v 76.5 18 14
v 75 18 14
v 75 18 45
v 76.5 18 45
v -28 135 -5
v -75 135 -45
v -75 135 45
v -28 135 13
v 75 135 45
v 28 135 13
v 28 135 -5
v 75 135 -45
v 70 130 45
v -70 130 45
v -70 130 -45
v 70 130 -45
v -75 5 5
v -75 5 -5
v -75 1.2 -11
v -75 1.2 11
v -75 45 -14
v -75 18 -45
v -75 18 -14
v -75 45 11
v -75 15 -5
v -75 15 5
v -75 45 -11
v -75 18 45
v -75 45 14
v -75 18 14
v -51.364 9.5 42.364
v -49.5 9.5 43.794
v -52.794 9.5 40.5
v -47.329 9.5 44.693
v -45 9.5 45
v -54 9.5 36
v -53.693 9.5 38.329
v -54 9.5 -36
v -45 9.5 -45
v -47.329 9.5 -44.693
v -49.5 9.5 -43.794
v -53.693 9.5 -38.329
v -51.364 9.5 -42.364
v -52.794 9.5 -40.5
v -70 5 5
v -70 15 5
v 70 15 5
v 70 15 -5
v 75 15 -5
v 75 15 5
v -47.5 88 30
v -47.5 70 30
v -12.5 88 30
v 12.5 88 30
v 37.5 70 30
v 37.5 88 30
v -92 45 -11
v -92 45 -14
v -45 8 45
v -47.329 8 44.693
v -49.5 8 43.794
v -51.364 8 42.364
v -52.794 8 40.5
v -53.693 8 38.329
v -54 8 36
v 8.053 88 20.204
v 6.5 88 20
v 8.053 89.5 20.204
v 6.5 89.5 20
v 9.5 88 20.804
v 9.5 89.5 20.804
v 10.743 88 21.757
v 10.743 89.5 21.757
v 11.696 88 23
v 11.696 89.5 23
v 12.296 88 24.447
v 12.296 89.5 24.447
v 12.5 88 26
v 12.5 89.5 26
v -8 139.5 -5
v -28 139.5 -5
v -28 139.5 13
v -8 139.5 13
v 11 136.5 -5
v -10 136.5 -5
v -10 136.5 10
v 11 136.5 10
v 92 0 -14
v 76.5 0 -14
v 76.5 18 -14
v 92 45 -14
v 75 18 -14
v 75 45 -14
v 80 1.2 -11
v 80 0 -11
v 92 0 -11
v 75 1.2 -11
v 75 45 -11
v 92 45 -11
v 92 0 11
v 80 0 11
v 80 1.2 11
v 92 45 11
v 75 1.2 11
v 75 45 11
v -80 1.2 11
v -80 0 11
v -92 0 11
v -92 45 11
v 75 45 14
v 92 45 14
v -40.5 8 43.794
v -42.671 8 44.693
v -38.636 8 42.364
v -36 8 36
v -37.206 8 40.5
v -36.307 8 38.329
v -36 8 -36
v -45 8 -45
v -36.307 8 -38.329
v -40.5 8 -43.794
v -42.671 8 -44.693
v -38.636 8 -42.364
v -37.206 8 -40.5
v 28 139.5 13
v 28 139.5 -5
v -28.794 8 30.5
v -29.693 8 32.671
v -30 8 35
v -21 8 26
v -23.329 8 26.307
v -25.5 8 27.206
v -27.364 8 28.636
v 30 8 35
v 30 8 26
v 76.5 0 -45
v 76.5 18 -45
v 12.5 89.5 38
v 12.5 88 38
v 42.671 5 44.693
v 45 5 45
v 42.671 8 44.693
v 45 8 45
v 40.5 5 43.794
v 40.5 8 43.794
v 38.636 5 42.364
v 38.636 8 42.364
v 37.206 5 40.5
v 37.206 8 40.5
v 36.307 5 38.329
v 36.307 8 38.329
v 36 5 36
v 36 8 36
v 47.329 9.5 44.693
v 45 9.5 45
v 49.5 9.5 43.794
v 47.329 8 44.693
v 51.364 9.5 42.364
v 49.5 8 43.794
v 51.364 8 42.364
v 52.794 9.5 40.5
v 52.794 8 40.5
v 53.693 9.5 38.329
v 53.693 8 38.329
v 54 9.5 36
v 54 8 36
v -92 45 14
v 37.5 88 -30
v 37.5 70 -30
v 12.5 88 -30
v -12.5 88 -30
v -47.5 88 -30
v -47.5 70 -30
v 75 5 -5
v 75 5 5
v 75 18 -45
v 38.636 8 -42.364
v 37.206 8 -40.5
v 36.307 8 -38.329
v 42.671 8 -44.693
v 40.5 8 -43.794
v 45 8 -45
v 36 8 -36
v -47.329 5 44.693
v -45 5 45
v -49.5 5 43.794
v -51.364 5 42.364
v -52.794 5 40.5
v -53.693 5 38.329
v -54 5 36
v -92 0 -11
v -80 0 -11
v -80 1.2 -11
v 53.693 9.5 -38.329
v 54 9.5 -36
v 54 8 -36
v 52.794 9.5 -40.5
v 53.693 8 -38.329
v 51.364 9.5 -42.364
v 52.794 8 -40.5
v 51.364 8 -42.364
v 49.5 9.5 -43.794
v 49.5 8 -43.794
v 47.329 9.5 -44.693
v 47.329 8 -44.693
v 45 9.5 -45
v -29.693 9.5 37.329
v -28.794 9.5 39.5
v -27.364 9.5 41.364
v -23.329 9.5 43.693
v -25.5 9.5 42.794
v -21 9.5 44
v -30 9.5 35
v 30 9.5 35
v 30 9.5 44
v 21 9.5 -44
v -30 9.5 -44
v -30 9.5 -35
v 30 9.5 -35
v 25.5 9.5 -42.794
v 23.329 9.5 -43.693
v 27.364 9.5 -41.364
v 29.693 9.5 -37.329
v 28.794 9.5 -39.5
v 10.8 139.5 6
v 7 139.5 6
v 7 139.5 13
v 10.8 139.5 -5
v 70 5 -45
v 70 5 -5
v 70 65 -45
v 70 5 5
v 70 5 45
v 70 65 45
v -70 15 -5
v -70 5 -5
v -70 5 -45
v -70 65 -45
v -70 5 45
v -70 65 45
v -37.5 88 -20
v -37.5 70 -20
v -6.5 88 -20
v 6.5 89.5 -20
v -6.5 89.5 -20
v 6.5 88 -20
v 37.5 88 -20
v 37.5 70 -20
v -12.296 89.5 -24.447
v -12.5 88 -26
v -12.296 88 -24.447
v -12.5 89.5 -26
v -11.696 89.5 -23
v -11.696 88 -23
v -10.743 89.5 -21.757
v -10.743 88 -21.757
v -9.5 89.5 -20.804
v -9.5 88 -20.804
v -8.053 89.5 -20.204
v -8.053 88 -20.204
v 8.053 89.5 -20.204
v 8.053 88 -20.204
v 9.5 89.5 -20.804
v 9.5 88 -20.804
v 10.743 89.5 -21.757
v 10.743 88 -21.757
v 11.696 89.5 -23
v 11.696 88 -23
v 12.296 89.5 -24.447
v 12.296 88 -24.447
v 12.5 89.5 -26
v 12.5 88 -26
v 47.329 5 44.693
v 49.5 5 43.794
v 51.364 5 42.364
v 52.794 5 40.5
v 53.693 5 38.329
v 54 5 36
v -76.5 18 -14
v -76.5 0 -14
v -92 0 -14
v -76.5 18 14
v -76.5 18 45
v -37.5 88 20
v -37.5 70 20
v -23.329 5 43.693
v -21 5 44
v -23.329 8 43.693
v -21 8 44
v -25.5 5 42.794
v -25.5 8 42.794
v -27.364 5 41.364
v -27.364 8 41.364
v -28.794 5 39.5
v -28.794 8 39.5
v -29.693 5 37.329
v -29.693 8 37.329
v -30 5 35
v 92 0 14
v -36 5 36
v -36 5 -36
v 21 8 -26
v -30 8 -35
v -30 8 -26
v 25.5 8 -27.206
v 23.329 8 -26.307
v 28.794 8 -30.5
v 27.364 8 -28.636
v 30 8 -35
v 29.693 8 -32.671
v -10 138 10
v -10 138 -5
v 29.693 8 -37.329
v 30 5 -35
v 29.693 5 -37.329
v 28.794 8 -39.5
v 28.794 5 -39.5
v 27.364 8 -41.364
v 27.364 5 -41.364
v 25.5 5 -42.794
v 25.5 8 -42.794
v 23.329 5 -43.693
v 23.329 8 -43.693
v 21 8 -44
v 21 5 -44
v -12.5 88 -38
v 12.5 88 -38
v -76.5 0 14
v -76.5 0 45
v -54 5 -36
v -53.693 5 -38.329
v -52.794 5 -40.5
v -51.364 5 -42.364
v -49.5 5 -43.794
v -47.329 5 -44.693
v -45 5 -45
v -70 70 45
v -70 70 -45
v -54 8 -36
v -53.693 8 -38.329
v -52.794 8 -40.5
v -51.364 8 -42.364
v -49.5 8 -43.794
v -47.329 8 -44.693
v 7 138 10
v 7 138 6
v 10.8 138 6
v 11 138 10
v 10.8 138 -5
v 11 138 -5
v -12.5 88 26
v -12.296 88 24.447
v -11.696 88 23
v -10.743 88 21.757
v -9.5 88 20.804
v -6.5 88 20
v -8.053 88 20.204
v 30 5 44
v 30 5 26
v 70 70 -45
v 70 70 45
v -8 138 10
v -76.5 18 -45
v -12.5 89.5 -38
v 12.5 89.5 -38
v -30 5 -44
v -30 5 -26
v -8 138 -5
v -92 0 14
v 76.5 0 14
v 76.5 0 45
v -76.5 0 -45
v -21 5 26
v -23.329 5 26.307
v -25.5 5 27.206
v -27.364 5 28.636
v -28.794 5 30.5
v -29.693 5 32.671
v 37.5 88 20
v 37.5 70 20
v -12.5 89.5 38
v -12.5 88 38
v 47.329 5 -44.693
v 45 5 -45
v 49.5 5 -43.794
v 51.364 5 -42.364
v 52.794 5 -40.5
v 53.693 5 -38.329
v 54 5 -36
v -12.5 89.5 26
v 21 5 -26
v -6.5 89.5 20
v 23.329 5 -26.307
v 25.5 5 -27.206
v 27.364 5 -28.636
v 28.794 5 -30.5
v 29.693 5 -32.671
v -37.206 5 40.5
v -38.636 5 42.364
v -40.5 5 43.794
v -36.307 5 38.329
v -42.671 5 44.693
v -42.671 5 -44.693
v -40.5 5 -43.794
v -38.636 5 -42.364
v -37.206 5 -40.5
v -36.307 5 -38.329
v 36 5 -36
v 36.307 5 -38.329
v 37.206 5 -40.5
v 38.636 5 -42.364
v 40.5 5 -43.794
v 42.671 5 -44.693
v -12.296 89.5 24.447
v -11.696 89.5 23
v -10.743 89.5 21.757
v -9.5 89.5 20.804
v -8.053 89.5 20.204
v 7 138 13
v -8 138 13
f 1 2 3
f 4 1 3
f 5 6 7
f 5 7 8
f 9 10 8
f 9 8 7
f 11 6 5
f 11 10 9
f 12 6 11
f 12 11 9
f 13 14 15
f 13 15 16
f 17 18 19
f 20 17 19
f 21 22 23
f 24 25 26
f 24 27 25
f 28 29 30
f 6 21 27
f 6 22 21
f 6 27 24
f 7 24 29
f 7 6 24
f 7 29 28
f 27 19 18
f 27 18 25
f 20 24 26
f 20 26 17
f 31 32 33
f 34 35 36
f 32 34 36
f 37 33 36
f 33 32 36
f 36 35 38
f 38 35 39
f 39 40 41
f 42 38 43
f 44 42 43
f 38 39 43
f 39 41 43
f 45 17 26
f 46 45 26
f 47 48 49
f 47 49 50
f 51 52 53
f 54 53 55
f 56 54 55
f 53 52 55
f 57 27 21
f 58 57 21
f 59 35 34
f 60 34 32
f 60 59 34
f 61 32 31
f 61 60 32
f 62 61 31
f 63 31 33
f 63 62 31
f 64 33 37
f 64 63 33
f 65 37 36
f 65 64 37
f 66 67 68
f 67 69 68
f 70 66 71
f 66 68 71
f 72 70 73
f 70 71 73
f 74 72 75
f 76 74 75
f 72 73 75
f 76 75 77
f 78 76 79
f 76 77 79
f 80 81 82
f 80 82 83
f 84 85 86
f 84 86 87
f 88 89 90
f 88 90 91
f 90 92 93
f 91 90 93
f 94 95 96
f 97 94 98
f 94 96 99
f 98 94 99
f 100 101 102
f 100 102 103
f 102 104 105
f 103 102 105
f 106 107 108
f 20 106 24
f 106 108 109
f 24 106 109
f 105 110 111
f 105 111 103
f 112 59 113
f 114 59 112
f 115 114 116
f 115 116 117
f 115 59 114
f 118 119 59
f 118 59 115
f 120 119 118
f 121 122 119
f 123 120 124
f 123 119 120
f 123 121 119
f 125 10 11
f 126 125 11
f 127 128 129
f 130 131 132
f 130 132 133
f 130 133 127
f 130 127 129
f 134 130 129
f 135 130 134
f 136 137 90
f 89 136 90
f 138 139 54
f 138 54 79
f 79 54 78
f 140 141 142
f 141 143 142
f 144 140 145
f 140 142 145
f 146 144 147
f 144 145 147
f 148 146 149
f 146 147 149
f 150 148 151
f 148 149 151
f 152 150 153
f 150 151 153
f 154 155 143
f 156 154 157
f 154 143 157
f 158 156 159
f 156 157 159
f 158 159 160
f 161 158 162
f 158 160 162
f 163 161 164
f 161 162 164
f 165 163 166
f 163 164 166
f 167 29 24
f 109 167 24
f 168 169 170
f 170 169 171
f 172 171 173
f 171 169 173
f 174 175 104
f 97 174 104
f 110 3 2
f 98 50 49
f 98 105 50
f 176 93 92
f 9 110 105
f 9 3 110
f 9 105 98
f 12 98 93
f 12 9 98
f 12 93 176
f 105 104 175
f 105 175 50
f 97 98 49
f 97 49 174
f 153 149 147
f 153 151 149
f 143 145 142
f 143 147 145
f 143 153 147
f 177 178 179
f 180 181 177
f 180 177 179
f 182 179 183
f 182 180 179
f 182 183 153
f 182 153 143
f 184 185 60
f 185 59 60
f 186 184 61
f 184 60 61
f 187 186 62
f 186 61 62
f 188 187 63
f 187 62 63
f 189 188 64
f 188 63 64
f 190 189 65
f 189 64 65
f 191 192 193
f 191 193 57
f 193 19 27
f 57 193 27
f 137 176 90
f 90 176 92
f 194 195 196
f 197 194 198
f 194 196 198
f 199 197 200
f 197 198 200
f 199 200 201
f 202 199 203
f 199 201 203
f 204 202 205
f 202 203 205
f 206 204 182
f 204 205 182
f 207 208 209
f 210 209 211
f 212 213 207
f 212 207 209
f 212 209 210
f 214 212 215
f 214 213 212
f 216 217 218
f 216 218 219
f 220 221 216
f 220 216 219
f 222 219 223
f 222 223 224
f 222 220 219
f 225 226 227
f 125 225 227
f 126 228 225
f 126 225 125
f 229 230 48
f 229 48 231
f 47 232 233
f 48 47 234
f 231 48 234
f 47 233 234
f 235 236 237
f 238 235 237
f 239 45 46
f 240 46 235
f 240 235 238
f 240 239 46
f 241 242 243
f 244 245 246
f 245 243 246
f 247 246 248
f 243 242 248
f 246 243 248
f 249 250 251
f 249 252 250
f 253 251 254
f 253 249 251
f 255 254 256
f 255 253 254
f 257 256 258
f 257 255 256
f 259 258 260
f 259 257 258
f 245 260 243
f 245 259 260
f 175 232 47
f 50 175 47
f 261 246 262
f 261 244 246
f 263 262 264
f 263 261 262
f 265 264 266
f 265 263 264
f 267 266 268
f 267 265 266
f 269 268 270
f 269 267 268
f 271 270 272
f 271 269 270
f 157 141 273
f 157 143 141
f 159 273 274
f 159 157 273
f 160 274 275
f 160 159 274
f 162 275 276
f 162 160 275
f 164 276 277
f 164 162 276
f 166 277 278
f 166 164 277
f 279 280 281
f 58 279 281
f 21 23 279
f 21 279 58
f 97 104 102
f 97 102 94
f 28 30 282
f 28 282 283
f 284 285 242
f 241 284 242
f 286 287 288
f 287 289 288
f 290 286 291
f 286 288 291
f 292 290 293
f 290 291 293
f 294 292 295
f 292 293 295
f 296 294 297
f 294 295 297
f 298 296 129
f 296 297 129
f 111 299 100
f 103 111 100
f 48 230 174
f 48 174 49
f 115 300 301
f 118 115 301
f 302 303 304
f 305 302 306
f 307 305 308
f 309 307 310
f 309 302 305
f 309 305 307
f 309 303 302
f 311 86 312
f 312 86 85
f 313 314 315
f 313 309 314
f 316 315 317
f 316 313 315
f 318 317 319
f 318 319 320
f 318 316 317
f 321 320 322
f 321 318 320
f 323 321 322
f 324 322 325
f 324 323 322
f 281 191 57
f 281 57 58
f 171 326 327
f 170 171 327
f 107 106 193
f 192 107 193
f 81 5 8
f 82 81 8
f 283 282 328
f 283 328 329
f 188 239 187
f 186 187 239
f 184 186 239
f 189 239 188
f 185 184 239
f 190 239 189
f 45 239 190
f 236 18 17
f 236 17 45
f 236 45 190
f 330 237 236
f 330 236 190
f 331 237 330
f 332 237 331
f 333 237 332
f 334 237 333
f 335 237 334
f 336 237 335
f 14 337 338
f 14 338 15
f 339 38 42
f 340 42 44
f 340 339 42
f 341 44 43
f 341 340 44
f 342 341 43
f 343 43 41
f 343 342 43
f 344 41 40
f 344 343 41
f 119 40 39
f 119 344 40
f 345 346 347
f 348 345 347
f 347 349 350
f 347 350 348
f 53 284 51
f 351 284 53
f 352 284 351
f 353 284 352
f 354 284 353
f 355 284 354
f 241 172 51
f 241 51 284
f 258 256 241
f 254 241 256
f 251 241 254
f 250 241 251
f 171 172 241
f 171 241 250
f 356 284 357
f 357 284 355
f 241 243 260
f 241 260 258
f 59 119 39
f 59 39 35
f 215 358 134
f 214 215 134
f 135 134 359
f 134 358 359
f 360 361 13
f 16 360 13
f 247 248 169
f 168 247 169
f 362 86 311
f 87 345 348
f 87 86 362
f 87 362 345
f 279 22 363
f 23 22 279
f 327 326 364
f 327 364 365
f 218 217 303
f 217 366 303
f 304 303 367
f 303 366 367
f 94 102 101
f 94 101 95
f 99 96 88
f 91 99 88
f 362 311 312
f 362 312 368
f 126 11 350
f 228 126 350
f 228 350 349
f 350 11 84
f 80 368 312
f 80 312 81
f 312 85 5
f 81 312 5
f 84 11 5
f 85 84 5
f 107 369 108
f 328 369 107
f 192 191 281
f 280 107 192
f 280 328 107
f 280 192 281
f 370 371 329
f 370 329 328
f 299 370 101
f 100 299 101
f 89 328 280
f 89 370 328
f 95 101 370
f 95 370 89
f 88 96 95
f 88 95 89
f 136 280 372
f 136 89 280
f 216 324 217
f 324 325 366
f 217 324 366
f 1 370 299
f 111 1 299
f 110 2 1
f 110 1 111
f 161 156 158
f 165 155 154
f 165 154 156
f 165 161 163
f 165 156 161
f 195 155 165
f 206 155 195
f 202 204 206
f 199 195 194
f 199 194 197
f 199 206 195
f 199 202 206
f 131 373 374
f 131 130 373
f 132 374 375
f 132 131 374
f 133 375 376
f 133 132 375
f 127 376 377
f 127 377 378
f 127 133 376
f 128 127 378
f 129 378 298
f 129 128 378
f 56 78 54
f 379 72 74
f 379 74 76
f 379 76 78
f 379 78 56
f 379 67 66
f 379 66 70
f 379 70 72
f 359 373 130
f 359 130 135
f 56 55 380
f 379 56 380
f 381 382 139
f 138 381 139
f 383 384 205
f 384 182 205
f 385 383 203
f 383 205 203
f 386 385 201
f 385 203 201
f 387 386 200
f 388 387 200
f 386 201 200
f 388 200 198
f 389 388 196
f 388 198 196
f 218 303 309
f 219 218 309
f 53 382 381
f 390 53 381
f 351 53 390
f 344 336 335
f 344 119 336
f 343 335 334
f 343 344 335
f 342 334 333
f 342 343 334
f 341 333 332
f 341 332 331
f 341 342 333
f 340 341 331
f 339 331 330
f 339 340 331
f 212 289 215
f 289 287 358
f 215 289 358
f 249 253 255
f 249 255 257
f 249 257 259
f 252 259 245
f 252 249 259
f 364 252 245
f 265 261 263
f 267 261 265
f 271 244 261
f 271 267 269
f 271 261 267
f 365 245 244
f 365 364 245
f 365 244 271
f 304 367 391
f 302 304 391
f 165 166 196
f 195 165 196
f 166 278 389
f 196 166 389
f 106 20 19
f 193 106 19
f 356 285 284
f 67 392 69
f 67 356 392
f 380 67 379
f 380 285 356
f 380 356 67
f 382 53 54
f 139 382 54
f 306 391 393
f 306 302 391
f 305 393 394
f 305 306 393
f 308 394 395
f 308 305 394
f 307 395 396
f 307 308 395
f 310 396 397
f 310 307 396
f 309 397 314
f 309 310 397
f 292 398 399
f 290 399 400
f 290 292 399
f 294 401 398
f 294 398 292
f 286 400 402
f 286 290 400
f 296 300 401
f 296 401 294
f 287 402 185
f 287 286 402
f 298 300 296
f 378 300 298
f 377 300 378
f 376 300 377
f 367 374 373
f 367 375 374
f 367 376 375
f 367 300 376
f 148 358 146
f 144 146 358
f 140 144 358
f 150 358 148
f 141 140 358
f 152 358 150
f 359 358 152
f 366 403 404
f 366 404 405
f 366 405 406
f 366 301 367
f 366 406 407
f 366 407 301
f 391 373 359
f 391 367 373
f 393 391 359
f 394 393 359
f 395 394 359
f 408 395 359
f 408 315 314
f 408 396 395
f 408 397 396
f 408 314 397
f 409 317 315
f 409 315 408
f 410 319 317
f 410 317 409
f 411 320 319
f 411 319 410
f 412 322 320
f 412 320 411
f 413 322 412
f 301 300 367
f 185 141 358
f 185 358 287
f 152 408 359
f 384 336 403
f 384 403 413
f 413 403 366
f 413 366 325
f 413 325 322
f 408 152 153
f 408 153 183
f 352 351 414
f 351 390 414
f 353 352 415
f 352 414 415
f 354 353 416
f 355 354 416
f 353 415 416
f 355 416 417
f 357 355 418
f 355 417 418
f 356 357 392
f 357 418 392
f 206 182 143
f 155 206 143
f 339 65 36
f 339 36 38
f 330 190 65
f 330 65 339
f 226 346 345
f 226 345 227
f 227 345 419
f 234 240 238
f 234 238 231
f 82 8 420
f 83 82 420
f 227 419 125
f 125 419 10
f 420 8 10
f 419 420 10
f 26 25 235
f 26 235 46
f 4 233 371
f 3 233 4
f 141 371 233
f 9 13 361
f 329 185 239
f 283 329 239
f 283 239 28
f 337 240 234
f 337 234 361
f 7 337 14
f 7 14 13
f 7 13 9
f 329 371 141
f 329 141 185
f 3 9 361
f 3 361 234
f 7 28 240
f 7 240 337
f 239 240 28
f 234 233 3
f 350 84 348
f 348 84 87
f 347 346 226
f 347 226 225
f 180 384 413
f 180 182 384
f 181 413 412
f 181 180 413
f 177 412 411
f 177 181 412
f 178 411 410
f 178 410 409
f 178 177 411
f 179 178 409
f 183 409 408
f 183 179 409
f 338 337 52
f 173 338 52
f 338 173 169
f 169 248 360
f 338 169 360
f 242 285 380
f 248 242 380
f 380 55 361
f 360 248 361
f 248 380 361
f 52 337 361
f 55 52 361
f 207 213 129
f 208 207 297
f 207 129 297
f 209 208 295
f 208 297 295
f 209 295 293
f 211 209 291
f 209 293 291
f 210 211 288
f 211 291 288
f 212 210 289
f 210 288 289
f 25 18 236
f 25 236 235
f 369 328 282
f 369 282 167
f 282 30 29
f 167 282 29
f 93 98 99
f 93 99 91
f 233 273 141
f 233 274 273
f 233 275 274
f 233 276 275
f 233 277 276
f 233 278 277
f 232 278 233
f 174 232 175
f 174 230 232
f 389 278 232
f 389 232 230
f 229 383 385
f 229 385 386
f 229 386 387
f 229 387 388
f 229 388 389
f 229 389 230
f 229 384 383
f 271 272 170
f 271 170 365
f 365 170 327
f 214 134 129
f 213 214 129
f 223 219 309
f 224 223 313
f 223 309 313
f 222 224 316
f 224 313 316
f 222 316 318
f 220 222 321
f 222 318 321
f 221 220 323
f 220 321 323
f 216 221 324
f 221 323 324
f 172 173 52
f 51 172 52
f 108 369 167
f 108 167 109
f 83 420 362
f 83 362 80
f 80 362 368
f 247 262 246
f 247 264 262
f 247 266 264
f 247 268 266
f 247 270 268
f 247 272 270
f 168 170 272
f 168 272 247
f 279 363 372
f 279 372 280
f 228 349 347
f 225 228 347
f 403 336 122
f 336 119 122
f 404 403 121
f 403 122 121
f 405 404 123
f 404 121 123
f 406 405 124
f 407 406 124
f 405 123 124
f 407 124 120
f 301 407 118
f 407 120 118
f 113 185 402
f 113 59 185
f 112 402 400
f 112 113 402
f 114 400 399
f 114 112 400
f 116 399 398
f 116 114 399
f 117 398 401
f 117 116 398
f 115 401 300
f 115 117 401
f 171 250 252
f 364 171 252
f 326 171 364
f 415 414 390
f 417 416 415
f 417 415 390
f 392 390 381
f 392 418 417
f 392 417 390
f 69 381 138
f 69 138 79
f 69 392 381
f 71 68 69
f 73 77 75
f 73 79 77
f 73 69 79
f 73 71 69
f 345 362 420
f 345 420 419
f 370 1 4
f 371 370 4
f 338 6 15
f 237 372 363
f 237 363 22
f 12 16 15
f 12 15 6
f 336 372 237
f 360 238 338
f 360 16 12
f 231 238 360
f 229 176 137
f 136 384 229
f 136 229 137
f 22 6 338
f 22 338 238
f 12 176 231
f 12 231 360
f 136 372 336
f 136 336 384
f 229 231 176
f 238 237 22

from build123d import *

# Parameters (mm, degrees)
SKETCH1_W            = 150
SKETCH1_H            = 90
BOSS_EXTRUDE1_DEPTH  = 135
SKETCH2_W            = 140
SKETCH2_H            = 60
CUT_EXTRUDE1_DEPTH   = 135
SKETCH3_W            = 3
SKETCH3_H            = 45
BOSS_EXTRUDE2_DEPTH  = 17
SKETCH4_W            = 22
SKETCH4_H            = 5
BOSS_EXTRUDE3_DEPTH  = 7
MIRROR2_OUTLINE_W    = 7
MIRROR2_OUTLINE_H    = 22
MIRROR2_DEPTH        = 5
SKETCH5_W            = 10
SKETCH5_H            = 10
CUT_EXTRUDE3_DEPTH   = 220.406016326
SKETCH6_W            = 56
SKETCH6_H            = 18
BOSS_EXTRUDE4_DEPTH  = 1.5
SKETCH7_W            = 18
SKETCH7_H            = 90
BOSS_EXTRUDE5_DEPTH  = 3
FILLET1_R            = 9
BOSS_EXTRUDE6_DEPTH  = 1.5
SKETCH11_W           = 60
SKETCH11_H           = 18
BOSS_EXTRUDE7_DEPTH  = 3
FILLET2_R            = 9
BOSS_EXTRUDE8_DEPTH  = 1.5
BOSS_EXTRUDE9_DEPTH  = 18
SKETCH15_W           = 25
SKETCH15_H           = 18
BOSS_EXTRUDE10_DEPTH = 1.5
FILLET3_R            = 6
SKETCH16_W           = 21
SKETCH16_H           = 3
BOSS_EXTRUDE11_DEPTH = 1.5
SKETCH17_W           = 3.8
SKETCH17_H           = 4
SKETCH17_H_2         = 3
SKETCH17_W_2         = 2
SKETCH17_H_3         = 15
BOSS_EXTRUDE13_DEPTH = 1.5
SKETCH18_W           = 31
SKETCH18_H           = 18
BOSS_EXTRUDE14_DEPTH = 1.5
SKETCH19_W           = 22
SKETCH19_H           = 5
CUT_EXTRUDE4_DEPTH   = 14
SKETCH20_W           = 22
SKETCH20_H           = 5
CUT_EXTRUDE5_DEPTH   = 7
SKETCH21_W           = 22
SKETCH21_H           = 1.2
BOSS_EXTRUDE15_DEPTH = 5


# Read off the part's stored shape, not the designer's step: Mirror2
with BuildPart() as part:
    # Sketch1 → Boss-Extrude1 (new body)
    with BuildSketch(Plane(origin=(0, 0, 0), x_dir=(1, 0, 0), z_dir=(0, 1, 0))):
        Rectangle(SKETCH1_W, SKETCH1_H)
    extrude(amount=BOSS_EXTRUDE1_DEPTH)

    # Sketch2 → Cut-Extrude1 (cut)
    with BuildSketch(Plane.XY.offset(45)):
        with Locations((0, 35)):
            Rectangle(SKETCH2_W, SKETCH2_H)
        with Locations((0, 100)):
            Rectangle(SKETCH2_W, SKETCH2_H)
    extrude(amount=-CUT_EXTRUDE1_DEPTH, mode=Mode.SUBTRACT)

    # Sketch3 → Boss-Extrude2 (add)
    with BuildSketch(Plane(origin=(75, 0, 0), x_dir=(0, 0, -1), z_dir=(1, 0, 0))):
        with Locations((12.5, 22.5)):
            Rectangle(SKETCH3_W, SKETCH3_H)
        with Locations((-12.5, 22.5)):
            Rectangle(SKETCH3_W, SKETCH3_H)
    boss_extrude2 = extrude(amount=BOSS_EXTRUDE2_DEPTH)

    # Mirror1: Boss-Extrude2 across plane
    add(boss_extrude2.mirror(Plane(origin=(0, 0, 0), x_dir=(0, 0, 1), z_dir=(1, 0, 0))))

    # Sketch4 → Boss-Extrude3 (add)
    with BuildSketch(Plane.ZY.offset(75)):
        with Locations((0, 2.5)):
            Rectangle(SKETCH4_W, SKETCH4_H)
    extrude(amount=BOSS_EXTRUDE3_DEPTH)

    # Mirror2 outline → Mirror2 (add)
    with BuildSketch(Plane(origin=(0, 0, 0), x_dir=(1, 0, 0), z_dir=(0, 1, 0))):
        with Locations((-85.5, 0)):
            Rectangle(MIRROR2_OUTLINE_W, MIRROR2_OUTLINE_H)
        with Locations((78.5, 0)):
            Rectangle(MIRROR2_OUTLINE_W, MIRROR2_OUTLINE_H)
    extrude(amount=MIRROR2_DEPTH)

    # Sketch5 → Cut-Extrude3 (cut, through all)
    with BuildSketch(Plane.ZY.offset(75)):
        with Locations((0, 10)):
            Rectangle(SKETCH5_W, SKETCH5_H)
    extrude(amount=-CUT_EXTRUDE3_DEPTH, mode=Mode.SUBTRACT)

    # Sketch6 → Boss-Extrude4 (add)
    with BuildSketch(Plane(origin=(0, 135, 0), x_dir=(1, 0, 0), z_dir=(0, 1, 0))):
        with Locations((0, -4)):
            Rectangle(SKETCH6_W, SKETCH6_H)
    extrude(amount=BOSS_EXTRUDE4_DEPTH)

    # Sketch7 → Boss-Extrude5 (add)
    with BuildSketch(Plane(origin=(0, 5, 0), x_dir=(1, 0, 0), z_dir=(0, 1, 0))):
        with Locations((45, 0)):
            Rectangle(SKETCH7_W, SKETCH7_H)
        with Locations((-45, 0)):
            Rectangle(SKETCH7_W, SKETCH7_H)
    extrude(amount=BOSS_EXTRUDE5_DEPTH)

    # Fillet1
    fillet1_edges = [part.edges().sort_by_distance(p)[0] for p in [
        (36, 6.5, 45),
        (54, 6.5, 45),
        (-36, 6.5, 45),
        (-54, 6.5, 45),
        (-54, 6.5, -45),
        (-36, 6.5, -45),
        (54, 6.5, -45),
        (36, 6.5, -45),
    ]]
    fillet(fillet1_edges, radius=FILLET1_R - 0.0001)  # a hair under: the kernel refuses the full size

    # Sketch10 → Boss-Extrude6 (add)
    with BuildSketch(Plane(origin=(0, 8, 0), x_dir=(1, 0, 0), z_dir=(0, 1, 0))):
        with BuildLine():
            Line((-45, 45), (-45, -45))
            ThreePointArc((-45, -45), (-51.363961031, -42.363961031), (-54, -36))
            Line((-54, -36), (-54, 36))
            ThreePointArc((-54, 36), (-51.363961031, 42.363961031), (-45, 45))
        make_face()
        with BuildLine():
            Line((45, 45), (45, -45))
            ThreePointArc((45, -45), (51.363961031, -42.363961031), (54, -36))
            Line((54, -36), (54, 36))
            ThreePointArc((54, 36), (51.363961031, 42.363961031), (45, 45))
        make_face()
    extrude(amount=BOSS_EXTRUDE6_DEPTH)

    # Sketch11 → Boss-Extrude7 (add)
    with BuildSketch(Plane(origin=(0, 5, 0), x_dir=(1, 0, 0), z_dir=(0, 1, 0))):
        with Locations((0, 35)):
            Rectangle(SKETCH11_W, SKETCH11_H)
        with Locations((0, -35)):
            Rectangle(SKETCH11_W, SKETCH11_H)
    extrude(amount=BOSS_EXTRUDE7_DEPTH)

    # Fillet2
    fillet2_edges = [part.edges().sort_by_distance(p)[0] for p in [
        (30, 6.5, -26),
        (30, 6.5, -44),
        (-30, 6.5, 26),
        (-30, 6.5, 44),
    ]]
    fillet(fillet2_edges, radius=FILLET2_R - 0.0001)  # a hair under: the kernel refuses the full size

    # Sketch13 → Boss-Extrude8 (add)
    with BuildSketch(Plane(origin=(0, 8, 0), x_dir=(1, 0, 0), z_dir=(0, 1, 0))):
        with BuildLine():
            Line((21, 44), (-30, 44))
            Line((-30, 44), (-30, 35))
            Line((-30, 35), (30, 35))
            ThreePointArc((30, 35), (27.363961031, 41.363961031), (21, 44))
        make_face()
        with BuildLine():
            Line((-21, -44), (30, -44))
            Line((30, -44), (30, -35))
            Line((30, -35), (-30, -35))
            ThreePointArc((-30, -35), (-27.363961031, -41.363961031), (-21, -44))
        make_face()
    extrude(amount=BOSS_EXTRUDE8_DEPTH)

    # Sketch14 → Boss-Extrude9 (add)
    with BuildSketch(Plane(origin=(0, 70, 0), x_dir=(1, 0, 0), z_dir=(0, 1, 0))):
        Polygon((-47.5, -30), (37.5, -30), (37.5, -20), (-37.5, -20), (-37.5, 20), (37.5, 20), (37.5, 30), (-47.5, 30), align=None)
    extrude(amount=BOSS_EXTRUDE9_DEPTH)

    # Sketch15 → Boss-Extrude10 (add)
    with BuildSketch(Plane(origin=(0, 88, 0), x_dir=(1, 0, 0), z_dir=(0, 1, 0))):
        with Locations((0, -29)):
            Rectangle(SKETCH15_W, SKETCH15_H)
        with Locations((0, 29)):
            Rectangle(SKETCH15_W, SKETCH15_H)
    extrude(amount=BOSS_EXTRUDE10_DEPTH)

    # Fillet3
    fillet3_edges = [part.edges().sort_by_distance(p)[0] for p in [
        (-12.5, 88.75, 20),
        (12.5, 88.75, 20),
        (-12.5, 88.75, -20),
        (12.5, 88.75, -20),
    ]]
    fillet(fillet3_edges, radius=FILLET3_R)

    # Sketch16 → Boss-Extrude11 (add)
    with BuildSketch(Plane(origin=(0, 136.5, 0), x_dir=(1, 0, 0), z_dir=(0, 1, 0))):
        Polygon((-10, 5), (-28, 5), (-28, -13), (-10, -13), (-10, -10), align=None)
        with Locations((0.5, -11.5)):
            Rectangle(SKETCH16_W, SKETCH16_H)
        Polygon((28, 5), (11, 5), (11, -10), (11, -13), (28, -13), align=None)
    extrude(amount=BOSS_EXTRUDE11_DEPTH)

    # Sketch17 → Boss-Extrude13 (add)
    with BuildSketch(Plane(origin=(0, 138, 0), x_dir=(1, 0, 0), z_dir=(0, 1, 0))):
        Polygon((10.8, -6), (10.8, -10), (11, -10), (11, 5), (10.8, 5), align=None)
        Polygon((10.8, -10), (10.8, -13), (28, -13), (28, 5), (11, 5), (11, -10), align=None)
        with Locations((8.9, -8)):
            Rectangle(SKETCH17_W, SKETCH17_H)
        with Locations((8.9, -11.5)):
            Rectangle(SKETCH17_W, SKETCH17_H_2)
        Polygon((-10, 5), (-28, 5), (-28, -13), (-8, -13), (-8, -10), (-10, -10), align=None)
        with Locations((-9, -2.5)):
            Rectangle(SKETCH17_W_2, SKETCH17_H_3)
    extrude(amount=BOSS_EXTRUDE13_DEPTH)

    # Sketch18 → Boss-Extrude14 (add)
    with BuildSketch(Plane.ZY.offset(75)):
        with Locations((29.5, 9)):
            Rectangle(SKETCH18_W, SKETCH18_H)
        with Locations((-29.5, 9)):
            Rectangle(SKETCH18_W, SKETCH18_H)
    boss_extrude14 = extrude(amount=BOSS_EXTRUDE14_DEPTH)

    # Mirror3: Boss-Extrude14 across plane
    add(boss_extrude14.mirror(Plane(origin=(0, 0, 0), x_dir=(0, 0, 1), z_dir=(1, 0, 0))))

    # Sketch19 → Cut-Extrude4 (cut)
    with BuildSketch(Plane.ZY.offset(89)):
        with Locations((0, 2.5)):
            Rectangle(SKETCH19_W, SKETCH19_H)
    extrude(amount=-CUT_EXTRUDE4_DEPTH, mode=Mode.SUBTRACT)

    # Sketch20 → Cut-Extrude5 (cut)
    with BuildSketch(Plane(origin=(82, 0, 0), x_dir=(0, 0, -1), z_dir=(1, 0, 0))):
        with Locations((0, 2.5)):
            Rectangle(SKETCH20_W, SKETCH20_H)
    extrude(amount=-CUT_EXTRUDE5_DEPTH, mode=Mode.SUBTRACT)

    # Sketch21 → Boss-Extrude15 (add)
    with BuildSketch(Plane(origin=(75, 0, 0), x_dir=(0, 0, -1), z_dir=(1, 0, 0))):
        with Locations((0, 0.6)):
            Rectangle(SKETCH21_W, SKETCH21_H)
    boss_extrude15 = extrude(amount=BOSS_EXTRUDE15_DEPTH)

    # Mirror4: Boss-Extrude15 across plane
    add(boss_extrude15.mirror(Plane(origin=(0, 0, 0), x_dir=(0, 0, 1), z_dir=(1, 0, 0))))


solid = part.part
